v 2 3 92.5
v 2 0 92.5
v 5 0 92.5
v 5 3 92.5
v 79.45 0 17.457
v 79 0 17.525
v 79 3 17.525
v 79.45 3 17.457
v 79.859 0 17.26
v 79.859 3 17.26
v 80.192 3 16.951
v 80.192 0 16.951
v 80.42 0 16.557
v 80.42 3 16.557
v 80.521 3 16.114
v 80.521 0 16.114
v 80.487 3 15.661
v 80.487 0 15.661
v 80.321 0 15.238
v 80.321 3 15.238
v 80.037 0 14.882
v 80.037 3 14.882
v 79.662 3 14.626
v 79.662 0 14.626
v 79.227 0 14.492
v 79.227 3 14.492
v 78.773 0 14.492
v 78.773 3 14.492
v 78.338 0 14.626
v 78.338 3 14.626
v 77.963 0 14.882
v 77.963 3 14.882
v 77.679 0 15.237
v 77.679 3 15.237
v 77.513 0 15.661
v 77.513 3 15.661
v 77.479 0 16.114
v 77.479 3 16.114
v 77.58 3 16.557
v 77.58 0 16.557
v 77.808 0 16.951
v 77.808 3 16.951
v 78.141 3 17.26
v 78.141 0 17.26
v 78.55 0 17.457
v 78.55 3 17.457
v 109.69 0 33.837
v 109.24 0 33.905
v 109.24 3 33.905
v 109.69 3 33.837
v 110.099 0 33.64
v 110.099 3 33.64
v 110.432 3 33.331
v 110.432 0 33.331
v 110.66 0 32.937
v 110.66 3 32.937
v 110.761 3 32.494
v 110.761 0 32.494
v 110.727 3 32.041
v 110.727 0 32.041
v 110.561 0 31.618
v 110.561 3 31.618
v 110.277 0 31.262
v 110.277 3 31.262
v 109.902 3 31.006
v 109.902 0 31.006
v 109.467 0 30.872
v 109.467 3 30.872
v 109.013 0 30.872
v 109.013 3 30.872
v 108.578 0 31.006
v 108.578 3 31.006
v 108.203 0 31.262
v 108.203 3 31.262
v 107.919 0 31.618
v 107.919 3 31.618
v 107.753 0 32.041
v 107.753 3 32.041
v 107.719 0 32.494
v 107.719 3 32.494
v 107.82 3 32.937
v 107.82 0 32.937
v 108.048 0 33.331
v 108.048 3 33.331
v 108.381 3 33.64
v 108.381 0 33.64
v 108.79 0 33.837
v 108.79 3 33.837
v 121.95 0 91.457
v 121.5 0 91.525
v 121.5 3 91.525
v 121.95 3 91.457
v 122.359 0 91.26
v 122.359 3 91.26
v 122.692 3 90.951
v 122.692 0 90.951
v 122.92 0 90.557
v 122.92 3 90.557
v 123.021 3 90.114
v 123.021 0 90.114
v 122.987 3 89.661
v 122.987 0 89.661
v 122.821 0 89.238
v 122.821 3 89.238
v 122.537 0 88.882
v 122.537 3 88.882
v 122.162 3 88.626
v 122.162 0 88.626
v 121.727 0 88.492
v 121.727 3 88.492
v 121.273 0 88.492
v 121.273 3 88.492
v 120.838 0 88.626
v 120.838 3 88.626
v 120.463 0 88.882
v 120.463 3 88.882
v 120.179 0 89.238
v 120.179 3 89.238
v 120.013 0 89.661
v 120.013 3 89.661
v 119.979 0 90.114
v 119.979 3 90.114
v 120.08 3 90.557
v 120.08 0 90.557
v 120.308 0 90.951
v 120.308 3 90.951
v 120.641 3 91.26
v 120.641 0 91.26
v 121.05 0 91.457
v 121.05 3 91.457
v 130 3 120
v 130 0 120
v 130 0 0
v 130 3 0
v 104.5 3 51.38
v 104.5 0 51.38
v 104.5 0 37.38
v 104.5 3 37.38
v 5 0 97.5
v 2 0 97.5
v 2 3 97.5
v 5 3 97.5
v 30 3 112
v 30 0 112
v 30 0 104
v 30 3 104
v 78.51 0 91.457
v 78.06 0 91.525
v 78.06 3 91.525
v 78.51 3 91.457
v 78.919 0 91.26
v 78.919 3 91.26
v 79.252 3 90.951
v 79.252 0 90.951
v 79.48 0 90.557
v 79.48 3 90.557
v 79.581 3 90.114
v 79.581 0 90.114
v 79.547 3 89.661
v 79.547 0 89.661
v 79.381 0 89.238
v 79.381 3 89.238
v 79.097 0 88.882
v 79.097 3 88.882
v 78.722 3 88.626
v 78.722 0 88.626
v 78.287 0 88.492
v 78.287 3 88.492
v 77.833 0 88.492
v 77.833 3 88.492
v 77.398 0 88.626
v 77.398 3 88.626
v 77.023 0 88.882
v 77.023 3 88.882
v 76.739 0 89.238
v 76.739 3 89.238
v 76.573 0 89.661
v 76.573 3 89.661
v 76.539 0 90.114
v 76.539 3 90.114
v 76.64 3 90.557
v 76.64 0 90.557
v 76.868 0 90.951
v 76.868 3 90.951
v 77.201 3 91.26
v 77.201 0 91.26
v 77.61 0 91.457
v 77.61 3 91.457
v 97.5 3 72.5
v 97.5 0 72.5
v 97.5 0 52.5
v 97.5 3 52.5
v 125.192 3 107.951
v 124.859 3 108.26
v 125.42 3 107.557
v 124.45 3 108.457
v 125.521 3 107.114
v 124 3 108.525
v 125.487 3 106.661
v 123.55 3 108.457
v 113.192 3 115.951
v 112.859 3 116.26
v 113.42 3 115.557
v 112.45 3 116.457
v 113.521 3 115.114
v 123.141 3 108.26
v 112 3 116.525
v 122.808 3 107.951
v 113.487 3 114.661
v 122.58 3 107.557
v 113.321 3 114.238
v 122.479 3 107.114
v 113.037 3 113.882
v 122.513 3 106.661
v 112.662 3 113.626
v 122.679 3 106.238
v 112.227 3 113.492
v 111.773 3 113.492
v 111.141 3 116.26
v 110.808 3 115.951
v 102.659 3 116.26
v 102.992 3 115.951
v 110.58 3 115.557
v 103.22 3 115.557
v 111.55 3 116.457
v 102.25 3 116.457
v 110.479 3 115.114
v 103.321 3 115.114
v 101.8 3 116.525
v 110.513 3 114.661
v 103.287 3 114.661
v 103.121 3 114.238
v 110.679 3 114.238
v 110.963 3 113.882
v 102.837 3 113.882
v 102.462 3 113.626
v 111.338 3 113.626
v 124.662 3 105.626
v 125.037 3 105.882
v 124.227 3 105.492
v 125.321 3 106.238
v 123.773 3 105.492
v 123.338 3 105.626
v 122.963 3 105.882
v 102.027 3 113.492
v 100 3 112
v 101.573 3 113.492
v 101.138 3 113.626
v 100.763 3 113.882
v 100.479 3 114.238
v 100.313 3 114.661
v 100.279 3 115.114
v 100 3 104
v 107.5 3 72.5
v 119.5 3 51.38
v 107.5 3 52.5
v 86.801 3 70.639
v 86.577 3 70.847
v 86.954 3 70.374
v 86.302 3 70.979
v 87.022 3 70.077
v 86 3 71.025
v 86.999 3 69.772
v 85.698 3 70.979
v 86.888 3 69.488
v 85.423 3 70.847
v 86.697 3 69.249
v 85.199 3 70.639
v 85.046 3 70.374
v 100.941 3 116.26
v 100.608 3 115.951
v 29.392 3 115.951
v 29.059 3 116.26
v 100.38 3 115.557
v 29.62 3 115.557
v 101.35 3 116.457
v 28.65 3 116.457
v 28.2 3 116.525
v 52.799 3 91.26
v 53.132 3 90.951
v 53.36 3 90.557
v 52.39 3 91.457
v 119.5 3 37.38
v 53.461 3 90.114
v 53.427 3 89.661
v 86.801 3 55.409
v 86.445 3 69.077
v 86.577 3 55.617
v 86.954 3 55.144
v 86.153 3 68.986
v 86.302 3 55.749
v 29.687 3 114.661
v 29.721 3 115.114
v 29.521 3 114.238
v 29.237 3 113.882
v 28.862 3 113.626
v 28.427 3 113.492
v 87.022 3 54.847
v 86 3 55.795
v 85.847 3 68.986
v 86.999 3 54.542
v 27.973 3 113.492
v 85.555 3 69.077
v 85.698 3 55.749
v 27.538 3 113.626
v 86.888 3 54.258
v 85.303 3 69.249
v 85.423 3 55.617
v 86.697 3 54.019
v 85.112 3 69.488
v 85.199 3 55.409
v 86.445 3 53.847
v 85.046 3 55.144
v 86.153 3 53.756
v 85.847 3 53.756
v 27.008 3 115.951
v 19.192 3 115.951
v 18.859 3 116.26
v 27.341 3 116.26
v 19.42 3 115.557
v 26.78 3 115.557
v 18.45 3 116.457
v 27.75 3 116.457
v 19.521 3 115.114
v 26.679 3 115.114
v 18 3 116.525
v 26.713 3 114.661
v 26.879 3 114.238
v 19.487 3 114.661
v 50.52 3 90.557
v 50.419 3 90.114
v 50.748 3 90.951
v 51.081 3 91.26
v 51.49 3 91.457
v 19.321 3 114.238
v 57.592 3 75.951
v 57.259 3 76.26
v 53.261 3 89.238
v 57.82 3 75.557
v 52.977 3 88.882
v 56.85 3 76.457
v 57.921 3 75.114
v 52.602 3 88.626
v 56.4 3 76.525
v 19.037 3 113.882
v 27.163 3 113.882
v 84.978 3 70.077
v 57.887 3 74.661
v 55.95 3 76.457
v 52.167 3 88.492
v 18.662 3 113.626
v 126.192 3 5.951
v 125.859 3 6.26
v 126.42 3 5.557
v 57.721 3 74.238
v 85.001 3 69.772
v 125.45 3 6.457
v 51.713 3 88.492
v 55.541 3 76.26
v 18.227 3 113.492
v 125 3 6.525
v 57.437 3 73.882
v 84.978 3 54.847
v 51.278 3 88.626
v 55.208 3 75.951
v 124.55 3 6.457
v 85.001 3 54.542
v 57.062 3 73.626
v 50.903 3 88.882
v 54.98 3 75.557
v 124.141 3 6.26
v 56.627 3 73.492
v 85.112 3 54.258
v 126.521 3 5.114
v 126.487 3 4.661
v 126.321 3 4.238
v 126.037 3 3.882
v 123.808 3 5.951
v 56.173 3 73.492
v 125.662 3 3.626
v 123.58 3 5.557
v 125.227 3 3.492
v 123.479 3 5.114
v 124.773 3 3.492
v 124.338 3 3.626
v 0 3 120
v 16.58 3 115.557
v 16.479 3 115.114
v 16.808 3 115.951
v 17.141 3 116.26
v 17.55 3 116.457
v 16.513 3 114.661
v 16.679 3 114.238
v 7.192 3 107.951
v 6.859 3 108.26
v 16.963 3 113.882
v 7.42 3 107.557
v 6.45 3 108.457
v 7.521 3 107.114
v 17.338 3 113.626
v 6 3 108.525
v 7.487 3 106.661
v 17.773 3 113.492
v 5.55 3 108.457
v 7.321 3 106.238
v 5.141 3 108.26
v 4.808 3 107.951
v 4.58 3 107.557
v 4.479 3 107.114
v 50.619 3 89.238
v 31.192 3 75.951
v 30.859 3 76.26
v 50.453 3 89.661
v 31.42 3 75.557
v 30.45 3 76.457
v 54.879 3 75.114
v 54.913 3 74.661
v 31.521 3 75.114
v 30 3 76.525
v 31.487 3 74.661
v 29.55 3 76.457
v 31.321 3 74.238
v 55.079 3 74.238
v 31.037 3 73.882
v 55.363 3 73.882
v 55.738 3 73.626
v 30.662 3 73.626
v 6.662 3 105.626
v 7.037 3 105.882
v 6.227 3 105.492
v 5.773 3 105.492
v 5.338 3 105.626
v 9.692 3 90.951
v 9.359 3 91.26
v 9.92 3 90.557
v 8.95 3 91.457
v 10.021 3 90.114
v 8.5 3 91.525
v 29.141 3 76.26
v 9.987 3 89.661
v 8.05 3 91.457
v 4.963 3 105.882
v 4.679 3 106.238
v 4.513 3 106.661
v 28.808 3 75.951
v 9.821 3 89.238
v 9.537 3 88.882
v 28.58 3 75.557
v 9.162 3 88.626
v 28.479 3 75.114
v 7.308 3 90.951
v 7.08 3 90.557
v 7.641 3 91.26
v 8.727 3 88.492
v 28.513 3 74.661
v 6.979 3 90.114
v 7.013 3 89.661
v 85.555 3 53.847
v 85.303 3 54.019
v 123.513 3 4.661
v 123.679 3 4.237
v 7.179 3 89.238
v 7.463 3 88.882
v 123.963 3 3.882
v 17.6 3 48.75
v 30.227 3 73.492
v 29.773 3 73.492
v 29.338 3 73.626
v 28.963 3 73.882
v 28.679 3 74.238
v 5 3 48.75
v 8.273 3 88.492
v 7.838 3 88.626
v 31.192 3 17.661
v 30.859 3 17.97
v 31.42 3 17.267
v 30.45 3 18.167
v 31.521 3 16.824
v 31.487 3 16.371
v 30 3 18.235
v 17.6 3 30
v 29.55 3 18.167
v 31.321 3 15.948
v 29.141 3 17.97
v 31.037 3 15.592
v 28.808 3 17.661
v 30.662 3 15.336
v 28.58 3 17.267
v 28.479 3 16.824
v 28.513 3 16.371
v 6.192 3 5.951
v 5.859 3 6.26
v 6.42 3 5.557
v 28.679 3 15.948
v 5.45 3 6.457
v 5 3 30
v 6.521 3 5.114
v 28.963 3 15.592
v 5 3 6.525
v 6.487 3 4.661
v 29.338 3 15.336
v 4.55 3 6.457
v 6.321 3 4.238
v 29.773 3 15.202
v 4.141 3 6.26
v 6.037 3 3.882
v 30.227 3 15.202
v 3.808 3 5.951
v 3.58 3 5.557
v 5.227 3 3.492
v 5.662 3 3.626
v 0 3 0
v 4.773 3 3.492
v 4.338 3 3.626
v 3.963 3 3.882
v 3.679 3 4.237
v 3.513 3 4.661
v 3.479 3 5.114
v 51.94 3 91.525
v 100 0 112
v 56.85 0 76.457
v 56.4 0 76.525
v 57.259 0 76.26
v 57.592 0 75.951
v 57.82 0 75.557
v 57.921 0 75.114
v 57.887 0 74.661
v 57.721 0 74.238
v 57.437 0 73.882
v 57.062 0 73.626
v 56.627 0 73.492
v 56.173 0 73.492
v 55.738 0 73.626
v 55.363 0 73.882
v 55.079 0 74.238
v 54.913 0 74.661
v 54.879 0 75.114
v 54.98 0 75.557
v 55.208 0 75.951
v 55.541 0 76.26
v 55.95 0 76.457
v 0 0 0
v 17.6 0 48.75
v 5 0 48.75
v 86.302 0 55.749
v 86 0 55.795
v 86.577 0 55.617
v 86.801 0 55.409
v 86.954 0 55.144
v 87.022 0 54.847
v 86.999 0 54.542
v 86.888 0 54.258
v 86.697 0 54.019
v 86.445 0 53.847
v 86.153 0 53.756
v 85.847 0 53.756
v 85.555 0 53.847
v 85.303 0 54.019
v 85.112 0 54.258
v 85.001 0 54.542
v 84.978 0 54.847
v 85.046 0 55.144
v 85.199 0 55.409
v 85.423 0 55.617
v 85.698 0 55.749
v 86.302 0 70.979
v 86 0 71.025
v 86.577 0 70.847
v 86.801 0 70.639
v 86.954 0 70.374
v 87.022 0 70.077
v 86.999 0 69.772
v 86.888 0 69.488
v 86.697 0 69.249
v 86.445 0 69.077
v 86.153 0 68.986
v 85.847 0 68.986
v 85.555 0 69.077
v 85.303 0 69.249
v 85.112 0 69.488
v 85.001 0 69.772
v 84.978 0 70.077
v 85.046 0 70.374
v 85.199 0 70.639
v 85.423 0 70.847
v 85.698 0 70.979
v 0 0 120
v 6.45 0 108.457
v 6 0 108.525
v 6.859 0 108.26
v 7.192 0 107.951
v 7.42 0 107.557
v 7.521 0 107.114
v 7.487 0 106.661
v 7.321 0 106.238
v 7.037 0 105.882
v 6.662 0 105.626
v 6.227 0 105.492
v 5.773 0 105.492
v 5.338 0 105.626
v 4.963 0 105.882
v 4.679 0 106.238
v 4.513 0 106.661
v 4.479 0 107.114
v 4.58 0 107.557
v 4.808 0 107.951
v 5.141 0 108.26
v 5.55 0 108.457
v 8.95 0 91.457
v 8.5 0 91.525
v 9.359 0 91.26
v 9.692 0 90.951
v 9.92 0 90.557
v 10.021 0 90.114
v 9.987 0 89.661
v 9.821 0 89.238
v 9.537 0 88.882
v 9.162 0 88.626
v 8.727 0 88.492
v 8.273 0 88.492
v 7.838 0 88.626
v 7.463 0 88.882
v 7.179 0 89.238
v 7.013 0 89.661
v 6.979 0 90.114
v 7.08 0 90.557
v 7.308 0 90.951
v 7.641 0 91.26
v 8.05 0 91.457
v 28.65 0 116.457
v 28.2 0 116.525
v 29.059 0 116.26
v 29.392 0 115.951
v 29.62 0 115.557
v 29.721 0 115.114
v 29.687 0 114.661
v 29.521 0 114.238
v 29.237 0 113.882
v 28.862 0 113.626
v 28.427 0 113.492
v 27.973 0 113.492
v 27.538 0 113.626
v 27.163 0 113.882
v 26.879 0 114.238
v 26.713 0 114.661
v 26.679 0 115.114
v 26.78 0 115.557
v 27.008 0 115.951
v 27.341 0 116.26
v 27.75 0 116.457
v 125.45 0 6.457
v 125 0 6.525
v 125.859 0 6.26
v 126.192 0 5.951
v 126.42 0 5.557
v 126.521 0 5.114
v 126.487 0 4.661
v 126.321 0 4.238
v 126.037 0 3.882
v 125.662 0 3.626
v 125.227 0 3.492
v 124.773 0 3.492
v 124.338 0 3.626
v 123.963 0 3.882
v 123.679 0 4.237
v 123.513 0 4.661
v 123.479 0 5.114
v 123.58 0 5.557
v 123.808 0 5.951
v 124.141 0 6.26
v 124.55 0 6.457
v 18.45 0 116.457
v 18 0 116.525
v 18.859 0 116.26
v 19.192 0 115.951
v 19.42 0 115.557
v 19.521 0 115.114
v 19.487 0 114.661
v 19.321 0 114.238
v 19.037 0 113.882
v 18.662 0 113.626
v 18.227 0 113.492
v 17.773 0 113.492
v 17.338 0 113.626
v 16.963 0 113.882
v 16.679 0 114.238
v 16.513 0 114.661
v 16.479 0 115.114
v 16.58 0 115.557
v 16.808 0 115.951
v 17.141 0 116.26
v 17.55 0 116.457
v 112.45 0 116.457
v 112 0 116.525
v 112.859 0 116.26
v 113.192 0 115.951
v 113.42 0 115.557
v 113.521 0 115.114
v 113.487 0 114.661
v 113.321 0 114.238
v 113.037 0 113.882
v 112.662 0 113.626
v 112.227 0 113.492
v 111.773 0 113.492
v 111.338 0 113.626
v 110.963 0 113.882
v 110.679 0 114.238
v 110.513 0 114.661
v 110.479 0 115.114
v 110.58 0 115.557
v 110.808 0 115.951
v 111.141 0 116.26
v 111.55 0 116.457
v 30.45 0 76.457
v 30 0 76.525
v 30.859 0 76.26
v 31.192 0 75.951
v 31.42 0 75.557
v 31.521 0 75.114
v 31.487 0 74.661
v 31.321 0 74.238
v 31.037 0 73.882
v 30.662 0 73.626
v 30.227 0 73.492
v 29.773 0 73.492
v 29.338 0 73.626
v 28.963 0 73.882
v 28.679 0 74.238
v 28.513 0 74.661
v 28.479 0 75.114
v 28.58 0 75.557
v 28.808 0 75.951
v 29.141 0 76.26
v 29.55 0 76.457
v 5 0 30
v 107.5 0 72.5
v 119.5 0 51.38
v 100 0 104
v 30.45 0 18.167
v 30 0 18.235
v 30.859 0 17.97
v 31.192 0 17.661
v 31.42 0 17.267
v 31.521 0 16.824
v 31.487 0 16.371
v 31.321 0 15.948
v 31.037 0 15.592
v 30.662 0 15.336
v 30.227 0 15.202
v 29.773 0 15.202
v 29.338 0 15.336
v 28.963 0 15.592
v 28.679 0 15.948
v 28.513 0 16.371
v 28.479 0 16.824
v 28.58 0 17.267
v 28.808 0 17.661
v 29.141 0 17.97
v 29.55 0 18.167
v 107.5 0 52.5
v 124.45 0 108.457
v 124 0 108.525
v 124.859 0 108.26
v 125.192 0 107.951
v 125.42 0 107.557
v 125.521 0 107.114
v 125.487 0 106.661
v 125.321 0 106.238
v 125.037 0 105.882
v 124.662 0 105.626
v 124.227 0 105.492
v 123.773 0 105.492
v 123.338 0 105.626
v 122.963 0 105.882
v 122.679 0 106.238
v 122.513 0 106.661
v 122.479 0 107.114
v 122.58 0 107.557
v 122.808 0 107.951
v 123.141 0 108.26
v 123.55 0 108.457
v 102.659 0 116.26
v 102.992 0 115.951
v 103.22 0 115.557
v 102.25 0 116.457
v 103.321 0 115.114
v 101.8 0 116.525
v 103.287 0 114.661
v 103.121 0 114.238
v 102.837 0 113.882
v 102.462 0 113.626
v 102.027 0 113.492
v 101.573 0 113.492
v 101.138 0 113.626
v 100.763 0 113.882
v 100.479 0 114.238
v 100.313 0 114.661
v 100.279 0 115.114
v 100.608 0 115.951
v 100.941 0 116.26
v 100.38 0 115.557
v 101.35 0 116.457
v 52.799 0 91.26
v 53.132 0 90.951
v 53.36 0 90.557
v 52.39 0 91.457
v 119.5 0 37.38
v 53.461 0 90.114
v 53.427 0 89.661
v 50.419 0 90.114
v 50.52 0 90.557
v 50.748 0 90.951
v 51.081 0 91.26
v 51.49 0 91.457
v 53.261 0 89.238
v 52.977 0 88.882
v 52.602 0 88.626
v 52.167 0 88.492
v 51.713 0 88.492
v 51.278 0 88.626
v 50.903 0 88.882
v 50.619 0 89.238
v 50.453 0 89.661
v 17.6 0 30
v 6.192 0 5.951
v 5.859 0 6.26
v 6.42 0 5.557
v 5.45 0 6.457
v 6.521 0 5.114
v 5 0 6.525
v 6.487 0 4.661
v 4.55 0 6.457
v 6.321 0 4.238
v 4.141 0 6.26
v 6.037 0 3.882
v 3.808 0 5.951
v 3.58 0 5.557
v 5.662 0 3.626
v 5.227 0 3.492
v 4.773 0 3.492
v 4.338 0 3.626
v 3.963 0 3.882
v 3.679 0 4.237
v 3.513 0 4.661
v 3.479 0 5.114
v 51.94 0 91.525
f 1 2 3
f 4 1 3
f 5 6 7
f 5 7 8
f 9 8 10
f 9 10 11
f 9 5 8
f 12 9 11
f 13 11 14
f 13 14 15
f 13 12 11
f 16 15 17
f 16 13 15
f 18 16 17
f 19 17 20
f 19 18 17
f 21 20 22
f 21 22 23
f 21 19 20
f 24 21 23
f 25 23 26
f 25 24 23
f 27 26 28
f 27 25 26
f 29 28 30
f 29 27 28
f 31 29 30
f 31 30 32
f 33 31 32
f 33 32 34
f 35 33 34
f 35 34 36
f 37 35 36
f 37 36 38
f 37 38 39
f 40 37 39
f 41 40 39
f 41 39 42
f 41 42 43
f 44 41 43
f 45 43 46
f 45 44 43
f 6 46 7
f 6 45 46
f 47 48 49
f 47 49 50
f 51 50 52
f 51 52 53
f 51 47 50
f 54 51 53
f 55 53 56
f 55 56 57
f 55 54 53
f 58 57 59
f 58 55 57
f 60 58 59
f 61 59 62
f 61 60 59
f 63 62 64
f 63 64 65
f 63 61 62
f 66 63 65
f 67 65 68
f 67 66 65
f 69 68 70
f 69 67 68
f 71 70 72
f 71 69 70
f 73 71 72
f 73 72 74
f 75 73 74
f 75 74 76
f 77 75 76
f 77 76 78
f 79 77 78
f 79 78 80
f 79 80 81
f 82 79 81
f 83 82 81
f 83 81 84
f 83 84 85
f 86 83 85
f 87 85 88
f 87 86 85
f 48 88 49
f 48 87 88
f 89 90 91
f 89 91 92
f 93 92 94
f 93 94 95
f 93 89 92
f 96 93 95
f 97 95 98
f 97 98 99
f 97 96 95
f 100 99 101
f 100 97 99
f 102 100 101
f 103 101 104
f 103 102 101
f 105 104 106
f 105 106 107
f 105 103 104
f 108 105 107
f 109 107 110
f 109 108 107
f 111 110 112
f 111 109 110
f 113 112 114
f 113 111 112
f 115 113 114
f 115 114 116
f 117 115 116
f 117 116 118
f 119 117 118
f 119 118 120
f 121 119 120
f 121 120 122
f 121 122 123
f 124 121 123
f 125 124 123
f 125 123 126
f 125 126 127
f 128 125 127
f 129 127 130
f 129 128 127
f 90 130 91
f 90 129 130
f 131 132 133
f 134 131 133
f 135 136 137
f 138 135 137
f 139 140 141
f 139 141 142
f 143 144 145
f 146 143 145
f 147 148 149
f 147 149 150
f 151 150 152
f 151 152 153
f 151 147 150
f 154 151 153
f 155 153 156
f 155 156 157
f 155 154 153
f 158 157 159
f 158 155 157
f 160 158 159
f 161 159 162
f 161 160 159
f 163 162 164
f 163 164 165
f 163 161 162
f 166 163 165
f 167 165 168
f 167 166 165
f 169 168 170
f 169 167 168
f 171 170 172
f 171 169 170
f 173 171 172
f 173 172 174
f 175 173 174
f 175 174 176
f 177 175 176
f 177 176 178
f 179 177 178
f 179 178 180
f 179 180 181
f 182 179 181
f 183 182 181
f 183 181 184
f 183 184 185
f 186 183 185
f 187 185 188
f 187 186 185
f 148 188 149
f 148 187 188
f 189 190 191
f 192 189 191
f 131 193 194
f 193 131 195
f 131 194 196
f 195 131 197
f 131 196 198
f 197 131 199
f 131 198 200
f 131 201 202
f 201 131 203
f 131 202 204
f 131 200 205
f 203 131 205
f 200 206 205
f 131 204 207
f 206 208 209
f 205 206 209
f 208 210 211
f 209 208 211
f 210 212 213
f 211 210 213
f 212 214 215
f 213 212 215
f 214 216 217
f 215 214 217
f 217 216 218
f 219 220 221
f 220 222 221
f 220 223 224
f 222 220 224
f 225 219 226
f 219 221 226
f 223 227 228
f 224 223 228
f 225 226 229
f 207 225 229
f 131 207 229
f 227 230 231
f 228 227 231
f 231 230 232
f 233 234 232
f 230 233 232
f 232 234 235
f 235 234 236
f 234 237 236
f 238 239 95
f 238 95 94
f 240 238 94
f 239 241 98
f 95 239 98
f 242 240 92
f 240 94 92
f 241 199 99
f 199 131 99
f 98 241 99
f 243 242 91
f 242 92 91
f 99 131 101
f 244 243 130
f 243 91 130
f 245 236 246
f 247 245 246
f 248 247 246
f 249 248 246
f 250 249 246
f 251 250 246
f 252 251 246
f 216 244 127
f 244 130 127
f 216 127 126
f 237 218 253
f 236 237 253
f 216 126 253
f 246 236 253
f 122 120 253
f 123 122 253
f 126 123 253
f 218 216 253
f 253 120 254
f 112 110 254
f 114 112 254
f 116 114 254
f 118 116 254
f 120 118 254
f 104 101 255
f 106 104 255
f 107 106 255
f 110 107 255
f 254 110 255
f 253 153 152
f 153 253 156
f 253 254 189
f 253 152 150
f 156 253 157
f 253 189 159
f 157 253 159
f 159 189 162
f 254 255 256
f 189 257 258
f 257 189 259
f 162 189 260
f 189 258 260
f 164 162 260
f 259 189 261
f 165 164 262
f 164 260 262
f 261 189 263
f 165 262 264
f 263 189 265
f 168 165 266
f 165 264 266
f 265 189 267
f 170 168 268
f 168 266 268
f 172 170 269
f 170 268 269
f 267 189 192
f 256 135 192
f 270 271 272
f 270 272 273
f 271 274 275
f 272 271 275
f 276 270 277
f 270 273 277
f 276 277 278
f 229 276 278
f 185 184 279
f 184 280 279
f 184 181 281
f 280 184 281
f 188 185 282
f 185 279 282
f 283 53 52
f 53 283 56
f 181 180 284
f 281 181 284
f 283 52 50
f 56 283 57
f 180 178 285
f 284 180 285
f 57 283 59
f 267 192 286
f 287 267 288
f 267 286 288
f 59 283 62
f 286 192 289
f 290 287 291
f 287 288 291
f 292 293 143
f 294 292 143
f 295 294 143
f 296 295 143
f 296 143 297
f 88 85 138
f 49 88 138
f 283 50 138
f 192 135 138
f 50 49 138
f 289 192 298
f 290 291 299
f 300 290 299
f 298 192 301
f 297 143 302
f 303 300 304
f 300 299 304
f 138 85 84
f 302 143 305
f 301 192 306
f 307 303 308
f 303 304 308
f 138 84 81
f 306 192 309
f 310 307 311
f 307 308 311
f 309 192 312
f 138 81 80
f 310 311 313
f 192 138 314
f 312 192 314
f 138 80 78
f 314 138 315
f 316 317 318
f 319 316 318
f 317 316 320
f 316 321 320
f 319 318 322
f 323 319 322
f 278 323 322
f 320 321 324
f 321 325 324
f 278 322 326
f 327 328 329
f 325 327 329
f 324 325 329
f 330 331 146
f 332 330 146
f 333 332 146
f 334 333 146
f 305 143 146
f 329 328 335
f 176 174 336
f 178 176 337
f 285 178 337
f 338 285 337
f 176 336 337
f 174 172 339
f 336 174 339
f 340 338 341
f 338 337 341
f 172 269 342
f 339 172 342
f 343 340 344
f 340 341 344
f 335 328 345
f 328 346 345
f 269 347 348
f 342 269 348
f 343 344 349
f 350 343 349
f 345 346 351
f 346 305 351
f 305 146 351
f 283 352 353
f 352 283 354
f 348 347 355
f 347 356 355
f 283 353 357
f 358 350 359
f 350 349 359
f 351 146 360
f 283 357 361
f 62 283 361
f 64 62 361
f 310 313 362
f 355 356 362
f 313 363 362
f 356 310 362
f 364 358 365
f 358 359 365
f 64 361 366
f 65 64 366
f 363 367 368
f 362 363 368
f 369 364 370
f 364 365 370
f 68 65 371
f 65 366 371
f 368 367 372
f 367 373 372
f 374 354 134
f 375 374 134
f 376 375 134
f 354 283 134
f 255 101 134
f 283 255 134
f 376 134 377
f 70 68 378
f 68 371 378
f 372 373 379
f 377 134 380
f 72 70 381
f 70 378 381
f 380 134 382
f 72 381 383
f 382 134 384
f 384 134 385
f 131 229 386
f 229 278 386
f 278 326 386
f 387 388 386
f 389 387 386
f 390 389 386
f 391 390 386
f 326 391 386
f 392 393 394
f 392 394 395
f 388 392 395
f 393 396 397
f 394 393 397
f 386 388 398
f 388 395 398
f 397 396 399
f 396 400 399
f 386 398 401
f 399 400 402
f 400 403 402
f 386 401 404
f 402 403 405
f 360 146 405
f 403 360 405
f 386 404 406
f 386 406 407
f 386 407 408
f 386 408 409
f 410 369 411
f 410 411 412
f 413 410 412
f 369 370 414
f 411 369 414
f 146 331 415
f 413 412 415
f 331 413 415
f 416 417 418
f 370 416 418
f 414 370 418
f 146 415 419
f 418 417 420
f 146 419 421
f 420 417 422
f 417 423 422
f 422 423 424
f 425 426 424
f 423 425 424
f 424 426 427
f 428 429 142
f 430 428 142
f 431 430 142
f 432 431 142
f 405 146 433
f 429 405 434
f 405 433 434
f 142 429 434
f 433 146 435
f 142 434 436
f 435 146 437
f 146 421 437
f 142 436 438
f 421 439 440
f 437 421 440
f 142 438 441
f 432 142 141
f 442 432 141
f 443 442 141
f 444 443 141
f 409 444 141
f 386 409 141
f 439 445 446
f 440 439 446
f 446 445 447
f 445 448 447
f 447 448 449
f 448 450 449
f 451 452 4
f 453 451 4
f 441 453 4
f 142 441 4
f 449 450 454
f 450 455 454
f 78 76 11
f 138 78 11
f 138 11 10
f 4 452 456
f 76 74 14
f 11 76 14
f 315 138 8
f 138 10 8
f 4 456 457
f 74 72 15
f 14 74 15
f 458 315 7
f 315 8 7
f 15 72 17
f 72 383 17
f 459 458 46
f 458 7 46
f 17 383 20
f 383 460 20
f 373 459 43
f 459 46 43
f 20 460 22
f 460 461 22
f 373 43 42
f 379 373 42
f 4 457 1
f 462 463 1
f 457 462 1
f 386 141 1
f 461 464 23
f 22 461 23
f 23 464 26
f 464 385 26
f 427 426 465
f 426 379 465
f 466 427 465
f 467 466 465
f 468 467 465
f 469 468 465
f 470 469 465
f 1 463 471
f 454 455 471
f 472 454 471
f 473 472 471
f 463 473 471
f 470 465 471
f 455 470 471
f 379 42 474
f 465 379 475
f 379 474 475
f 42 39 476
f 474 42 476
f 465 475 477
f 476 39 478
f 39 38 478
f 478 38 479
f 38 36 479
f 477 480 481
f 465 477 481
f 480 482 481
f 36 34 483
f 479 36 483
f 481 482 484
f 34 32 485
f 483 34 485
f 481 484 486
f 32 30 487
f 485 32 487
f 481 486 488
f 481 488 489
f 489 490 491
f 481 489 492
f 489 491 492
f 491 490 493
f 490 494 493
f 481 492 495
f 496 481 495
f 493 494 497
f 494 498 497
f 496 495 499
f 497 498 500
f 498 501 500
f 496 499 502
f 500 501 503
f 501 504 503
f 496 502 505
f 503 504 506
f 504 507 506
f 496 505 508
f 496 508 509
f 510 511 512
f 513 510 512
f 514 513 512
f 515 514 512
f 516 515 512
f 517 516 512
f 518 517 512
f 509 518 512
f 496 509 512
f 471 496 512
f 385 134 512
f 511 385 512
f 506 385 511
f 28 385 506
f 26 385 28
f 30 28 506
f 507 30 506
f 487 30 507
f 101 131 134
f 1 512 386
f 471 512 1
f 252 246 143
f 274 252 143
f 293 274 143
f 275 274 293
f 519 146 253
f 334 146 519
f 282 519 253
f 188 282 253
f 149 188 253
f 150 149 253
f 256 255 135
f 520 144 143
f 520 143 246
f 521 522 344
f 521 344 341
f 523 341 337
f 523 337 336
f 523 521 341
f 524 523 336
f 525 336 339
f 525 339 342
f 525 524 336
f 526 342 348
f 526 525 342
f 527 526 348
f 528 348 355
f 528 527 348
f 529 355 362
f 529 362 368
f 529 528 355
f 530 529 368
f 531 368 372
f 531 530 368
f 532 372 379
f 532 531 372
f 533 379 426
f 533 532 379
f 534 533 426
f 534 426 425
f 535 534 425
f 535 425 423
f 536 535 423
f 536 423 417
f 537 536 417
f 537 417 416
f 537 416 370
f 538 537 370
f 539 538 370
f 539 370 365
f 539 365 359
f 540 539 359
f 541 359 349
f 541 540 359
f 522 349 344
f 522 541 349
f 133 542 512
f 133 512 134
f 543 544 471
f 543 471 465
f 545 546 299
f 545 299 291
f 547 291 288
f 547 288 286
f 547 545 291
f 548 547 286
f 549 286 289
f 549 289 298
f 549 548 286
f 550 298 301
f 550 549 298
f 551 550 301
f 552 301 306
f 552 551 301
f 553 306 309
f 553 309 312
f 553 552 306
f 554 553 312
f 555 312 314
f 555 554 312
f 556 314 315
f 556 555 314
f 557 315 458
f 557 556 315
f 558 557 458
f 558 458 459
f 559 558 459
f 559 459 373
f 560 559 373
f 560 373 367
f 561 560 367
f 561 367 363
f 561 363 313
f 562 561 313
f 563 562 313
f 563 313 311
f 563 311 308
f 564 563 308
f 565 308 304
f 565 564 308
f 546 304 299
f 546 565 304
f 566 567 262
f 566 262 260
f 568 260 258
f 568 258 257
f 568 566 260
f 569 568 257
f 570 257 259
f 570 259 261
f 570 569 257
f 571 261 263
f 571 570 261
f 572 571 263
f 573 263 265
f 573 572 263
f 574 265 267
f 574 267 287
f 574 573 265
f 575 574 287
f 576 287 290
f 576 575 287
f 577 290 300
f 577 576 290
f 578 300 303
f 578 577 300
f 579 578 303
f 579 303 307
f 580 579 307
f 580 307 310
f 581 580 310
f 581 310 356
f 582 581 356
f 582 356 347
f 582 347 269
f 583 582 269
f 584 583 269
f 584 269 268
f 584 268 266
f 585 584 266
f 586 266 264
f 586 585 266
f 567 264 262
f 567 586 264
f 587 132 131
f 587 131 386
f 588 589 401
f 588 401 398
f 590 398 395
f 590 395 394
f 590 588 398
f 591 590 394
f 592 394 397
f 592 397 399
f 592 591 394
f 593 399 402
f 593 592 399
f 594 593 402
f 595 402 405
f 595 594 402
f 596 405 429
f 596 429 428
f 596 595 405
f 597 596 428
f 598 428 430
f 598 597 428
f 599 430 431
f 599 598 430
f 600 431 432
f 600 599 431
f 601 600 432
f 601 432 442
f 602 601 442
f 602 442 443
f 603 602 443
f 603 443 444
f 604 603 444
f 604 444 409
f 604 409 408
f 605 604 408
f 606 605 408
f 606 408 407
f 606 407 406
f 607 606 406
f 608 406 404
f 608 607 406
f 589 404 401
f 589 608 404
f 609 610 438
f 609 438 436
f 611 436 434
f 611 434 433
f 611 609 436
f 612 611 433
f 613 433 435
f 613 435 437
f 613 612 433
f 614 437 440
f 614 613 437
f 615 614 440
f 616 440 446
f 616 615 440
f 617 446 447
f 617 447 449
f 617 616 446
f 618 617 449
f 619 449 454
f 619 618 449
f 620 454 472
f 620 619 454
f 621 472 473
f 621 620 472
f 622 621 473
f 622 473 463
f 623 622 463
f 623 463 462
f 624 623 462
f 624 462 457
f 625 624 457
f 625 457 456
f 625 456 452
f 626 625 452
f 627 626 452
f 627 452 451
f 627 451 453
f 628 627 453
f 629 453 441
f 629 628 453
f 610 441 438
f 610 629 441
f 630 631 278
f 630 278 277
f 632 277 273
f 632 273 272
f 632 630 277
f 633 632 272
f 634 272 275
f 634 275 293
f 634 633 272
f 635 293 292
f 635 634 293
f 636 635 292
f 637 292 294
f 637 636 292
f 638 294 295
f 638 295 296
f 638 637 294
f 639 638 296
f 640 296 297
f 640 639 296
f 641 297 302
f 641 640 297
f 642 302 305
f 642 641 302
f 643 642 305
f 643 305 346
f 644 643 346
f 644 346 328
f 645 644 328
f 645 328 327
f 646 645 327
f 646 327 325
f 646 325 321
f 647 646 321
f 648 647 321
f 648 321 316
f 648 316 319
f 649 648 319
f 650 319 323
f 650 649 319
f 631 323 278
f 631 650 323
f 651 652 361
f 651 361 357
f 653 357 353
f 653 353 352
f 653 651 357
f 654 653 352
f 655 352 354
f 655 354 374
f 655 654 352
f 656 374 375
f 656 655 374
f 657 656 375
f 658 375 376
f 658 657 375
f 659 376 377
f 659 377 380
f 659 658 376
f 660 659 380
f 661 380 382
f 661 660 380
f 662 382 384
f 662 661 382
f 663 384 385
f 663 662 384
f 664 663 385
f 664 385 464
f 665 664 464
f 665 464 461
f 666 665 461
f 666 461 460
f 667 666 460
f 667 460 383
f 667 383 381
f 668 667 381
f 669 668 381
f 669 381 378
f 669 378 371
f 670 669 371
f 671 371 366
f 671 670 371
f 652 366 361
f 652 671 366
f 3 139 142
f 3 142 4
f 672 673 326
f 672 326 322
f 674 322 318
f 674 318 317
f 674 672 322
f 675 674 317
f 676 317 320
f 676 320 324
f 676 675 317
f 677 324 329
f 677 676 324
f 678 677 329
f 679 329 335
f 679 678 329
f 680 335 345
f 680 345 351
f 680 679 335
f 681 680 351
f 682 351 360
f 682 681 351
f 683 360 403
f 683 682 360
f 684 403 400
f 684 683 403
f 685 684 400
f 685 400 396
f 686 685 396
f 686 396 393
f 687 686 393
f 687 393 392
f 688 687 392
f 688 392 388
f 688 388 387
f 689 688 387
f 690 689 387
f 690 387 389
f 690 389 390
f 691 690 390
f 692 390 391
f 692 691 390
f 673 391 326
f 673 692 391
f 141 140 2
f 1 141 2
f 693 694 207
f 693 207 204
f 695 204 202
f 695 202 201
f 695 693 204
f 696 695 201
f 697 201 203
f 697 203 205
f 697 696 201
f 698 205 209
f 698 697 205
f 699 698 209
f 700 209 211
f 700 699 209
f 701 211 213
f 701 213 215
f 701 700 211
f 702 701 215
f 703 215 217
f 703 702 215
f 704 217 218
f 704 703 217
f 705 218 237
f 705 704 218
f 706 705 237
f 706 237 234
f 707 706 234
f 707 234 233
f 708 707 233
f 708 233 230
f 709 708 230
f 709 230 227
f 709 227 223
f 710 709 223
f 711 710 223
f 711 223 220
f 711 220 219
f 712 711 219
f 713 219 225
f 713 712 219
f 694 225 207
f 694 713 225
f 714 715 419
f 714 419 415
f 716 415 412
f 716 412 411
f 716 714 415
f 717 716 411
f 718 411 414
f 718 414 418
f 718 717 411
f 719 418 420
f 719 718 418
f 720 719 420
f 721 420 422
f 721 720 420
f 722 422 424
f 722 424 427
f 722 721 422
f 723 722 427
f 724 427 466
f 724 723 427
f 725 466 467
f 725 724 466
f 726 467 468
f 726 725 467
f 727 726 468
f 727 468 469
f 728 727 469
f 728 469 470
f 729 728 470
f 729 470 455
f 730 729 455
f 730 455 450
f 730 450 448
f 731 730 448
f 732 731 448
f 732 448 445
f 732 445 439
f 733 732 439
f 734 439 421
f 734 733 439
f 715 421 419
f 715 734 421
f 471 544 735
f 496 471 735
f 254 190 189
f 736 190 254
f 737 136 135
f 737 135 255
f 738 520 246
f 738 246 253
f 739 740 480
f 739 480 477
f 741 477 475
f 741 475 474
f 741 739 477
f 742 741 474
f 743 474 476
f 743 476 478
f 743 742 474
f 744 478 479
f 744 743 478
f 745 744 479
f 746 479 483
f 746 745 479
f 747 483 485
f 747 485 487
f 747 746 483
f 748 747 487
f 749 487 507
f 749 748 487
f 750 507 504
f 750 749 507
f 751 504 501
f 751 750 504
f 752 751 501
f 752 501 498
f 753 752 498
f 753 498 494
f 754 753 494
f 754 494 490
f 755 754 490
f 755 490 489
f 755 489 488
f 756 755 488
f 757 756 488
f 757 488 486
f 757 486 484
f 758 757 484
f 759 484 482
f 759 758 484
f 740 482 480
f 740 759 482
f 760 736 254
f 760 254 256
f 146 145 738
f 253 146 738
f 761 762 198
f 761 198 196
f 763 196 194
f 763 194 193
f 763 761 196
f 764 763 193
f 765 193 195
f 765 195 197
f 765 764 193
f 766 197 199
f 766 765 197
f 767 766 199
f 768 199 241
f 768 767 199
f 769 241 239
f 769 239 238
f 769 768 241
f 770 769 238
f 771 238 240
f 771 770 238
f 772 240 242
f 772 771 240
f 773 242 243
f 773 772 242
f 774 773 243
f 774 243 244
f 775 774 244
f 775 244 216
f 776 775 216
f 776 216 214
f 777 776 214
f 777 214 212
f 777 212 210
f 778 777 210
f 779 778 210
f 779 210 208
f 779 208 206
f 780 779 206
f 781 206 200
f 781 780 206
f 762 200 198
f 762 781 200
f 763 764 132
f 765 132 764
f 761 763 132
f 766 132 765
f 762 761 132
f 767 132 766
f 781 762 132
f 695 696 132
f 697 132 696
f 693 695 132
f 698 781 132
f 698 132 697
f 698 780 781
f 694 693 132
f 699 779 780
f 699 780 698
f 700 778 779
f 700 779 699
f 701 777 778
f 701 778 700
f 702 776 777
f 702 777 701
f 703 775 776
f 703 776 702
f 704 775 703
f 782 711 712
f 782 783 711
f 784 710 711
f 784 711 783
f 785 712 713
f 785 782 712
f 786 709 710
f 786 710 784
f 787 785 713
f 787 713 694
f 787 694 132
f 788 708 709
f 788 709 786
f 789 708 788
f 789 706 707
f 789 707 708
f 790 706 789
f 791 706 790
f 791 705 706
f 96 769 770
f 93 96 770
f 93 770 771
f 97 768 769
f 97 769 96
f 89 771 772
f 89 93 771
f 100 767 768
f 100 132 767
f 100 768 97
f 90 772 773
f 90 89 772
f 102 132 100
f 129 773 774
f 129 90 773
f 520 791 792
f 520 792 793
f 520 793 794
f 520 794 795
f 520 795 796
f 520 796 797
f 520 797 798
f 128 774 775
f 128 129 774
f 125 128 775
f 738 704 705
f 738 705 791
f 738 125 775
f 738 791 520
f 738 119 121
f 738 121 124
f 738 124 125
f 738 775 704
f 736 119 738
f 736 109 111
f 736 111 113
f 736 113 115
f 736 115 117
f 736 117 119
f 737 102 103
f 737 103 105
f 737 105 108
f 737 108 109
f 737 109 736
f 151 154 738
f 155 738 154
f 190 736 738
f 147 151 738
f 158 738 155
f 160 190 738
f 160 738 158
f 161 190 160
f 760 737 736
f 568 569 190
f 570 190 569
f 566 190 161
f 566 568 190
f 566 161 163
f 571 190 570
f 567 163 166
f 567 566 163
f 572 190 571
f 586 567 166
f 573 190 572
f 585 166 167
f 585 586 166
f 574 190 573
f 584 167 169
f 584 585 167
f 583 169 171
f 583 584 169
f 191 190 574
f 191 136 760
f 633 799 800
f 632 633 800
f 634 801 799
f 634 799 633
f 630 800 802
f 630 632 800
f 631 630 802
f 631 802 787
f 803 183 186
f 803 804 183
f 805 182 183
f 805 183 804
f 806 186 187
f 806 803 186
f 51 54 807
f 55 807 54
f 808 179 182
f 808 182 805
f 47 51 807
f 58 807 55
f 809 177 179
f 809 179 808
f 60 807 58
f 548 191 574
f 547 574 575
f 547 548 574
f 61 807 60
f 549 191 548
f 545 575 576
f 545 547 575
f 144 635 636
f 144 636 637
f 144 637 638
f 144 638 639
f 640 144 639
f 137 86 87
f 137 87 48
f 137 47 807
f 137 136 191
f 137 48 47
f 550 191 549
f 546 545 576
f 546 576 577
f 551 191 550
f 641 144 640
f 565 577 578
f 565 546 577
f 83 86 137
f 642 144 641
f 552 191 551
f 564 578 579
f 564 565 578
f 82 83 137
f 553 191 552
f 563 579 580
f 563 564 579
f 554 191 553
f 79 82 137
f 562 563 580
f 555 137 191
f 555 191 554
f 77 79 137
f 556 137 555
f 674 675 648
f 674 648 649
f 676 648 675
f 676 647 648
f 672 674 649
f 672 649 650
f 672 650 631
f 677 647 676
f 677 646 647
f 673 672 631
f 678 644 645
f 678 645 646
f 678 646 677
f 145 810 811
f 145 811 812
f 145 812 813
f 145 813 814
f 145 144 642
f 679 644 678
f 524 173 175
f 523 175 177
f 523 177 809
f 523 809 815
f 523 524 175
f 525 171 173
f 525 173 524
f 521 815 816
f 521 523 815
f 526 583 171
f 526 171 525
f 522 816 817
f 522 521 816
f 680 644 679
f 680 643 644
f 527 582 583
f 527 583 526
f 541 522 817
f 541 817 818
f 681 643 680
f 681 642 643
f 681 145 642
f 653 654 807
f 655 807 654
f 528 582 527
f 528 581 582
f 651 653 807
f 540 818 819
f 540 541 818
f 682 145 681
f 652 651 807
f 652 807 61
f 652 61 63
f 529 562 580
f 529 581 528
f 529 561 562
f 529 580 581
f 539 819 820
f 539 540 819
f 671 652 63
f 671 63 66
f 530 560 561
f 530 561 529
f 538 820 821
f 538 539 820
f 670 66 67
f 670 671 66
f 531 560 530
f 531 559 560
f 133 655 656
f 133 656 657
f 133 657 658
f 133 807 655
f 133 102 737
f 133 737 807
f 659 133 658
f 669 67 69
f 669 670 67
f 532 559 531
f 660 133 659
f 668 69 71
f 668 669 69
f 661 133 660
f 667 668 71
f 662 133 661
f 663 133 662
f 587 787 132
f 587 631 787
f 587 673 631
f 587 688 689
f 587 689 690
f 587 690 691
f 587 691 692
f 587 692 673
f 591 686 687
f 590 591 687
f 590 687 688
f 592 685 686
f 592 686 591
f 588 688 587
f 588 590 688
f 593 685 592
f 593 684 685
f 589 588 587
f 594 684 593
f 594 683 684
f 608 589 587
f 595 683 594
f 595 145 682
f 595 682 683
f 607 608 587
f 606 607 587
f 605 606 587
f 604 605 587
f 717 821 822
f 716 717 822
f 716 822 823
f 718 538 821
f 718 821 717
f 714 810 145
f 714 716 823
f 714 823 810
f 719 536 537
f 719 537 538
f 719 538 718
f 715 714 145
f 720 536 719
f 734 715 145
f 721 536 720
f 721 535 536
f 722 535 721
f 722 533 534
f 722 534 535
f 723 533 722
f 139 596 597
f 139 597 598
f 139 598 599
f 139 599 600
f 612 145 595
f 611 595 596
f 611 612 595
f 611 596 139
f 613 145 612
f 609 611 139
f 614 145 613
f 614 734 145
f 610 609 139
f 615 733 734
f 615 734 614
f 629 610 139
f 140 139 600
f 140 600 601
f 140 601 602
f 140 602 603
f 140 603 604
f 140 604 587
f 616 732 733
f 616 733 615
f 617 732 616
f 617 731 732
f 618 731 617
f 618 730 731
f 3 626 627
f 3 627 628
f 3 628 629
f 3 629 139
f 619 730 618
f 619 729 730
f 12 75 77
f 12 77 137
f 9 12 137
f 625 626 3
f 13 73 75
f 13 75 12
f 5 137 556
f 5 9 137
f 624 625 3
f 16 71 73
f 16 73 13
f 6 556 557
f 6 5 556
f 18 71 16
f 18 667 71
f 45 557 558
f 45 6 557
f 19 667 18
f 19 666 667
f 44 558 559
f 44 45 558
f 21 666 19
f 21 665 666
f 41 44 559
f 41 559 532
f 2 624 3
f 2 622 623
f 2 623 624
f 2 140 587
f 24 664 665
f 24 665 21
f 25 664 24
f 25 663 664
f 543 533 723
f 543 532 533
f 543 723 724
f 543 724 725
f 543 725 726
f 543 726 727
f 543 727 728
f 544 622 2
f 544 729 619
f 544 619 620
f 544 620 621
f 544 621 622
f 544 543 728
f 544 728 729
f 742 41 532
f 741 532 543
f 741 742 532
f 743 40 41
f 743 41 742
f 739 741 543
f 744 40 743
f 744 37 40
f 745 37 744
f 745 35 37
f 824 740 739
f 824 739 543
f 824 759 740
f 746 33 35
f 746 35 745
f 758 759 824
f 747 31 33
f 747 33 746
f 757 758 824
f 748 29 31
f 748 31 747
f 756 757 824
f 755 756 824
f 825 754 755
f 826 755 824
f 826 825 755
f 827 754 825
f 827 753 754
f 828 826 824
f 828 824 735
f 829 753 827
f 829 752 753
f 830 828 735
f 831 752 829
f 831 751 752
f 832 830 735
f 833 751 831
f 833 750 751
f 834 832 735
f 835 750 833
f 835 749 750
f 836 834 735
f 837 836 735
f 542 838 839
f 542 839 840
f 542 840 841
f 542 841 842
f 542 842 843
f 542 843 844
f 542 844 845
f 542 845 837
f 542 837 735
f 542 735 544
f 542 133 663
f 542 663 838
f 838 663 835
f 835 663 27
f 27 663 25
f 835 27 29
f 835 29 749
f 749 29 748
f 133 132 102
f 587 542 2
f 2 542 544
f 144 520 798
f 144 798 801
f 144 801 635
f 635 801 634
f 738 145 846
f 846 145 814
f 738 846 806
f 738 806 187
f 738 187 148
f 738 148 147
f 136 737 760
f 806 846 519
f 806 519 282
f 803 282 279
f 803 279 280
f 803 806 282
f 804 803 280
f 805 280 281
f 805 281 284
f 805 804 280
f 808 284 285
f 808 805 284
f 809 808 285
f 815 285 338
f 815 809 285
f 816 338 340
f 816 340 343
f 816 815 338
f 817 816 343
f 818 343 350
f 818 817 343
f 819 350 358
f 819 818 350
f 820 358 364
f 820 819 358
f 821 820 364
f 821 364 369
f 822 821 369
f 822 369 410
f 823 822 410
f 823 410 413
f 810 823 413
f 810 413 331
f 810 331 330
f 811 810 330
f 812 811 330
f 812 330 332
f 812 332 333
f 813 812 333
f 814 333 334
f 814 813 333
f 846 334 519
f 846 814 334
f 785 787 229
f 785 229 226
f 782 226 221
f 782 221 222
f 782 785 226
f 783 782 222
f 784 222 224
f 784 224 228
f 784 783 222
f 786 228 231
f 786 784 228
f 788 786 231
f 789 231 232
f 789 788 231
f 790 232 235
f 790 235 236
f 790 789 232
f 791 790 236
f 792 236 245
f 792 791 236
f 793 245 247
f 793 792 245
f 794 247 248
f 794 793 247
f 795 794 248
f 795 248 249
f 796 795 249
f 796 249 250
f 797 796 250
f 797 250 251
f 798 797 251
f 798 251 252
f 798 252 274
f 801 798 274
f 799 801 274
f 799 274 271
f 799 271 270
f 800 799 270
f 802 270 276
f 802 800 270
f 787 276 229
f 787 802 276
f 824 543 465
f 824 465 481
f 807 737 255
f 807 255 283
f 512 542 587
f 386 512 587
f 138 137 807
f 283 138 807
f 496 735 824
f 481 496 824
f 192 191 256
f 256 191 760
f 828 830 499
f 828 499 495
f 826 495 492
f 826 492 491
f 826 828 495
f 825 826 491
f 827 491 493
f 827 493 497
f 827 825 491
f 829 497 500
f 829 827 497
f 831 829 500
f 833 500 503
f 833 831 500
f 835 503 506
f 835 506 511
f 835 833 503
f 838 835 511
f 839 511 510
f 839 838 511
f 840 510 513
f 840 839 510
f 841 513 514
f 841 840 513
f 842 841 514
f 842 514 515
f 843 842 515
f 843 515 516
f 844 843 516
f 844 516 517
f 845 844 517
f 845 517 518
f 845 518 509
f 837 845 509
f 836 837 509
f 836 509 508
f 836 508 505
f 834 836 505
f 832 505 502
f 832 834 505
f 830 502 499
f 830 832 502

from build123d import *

# Parameters (mm, degrees)
SKETCH1_R           = 1.525
SKETCH1_R_2         = 1.025
SKETCH1_W           = 70
SKETCH1_H           = 8
SKETCH1_W_2         = 3
SKETCH1_H_2         = 5
SKETCH1_W_3         = 10
SKETCH1_H_3         = 20
SKETCH1_W_4         = 15
SKETCH1_H_4         = 14
SKETCH1_W_5         = 12.6
SKETCH1_H_5         = 18.75
BOSS_EXTRUDE1_DEPTH = 3


with BuildPart() as part:
    # Sketch1 → Boss-Extrude1 (new body)
    with BuildSketch(Plane(origin=(0, 0, 0), x_dir=(1, 0, 0), z_dir=(0, 1, 0))):
        Polygon((0, 0), (130, 0), (130, -92.5), (130, -97.5), (130, -120), (0, -120), (0, -97.5), (0, -92.5), align=None)
        with Locations(Location((28.2, -115, 0), (0, 0, 270))):
            Circle(SKETCH1_R, mode=Mode.SUBTRACT)
        with Locations(Location((101.8, -115, 0), (0, 0, 270))):
            Circle(SKETCH1_R, mode=Mode.SUBTRACT)
        with Locations(Location((121.5, -90, 0), (0, 0, 270))):
            Circle(SKETCH1_R, mode=Mode.SUBTRACT)
        with Locations(Location((8.5, -90, 0), (0, 0, 270))):
            Circle(SKETCH1_R, mode=Mode.SUBTRACT)
        with Locations(Location((78.06, -90, 0), (0, 0, 270))):
            Circle(SKETCH1_R, mode=Mode.SUBTRACT)
        with Locations(Location((51.94, -90, 0), (0, 0, 270))):
            Circle(SKETCH1_R, mode=Mode.SUBTRACT)
        with Locations(Location((124, -107, 0), (0, 0, 270))):
            Circle(SKETCH1_R, mode=Mode.SUBTRACT)
        with Locations(Location((6, -107, 0), (0, 0, 270))):
            Circle(SKETCH1_R, mode=Mode.SUBTRACT)
        with Locations(Location((30, -75, 0), (0, 0, 270))):
            Circle(SKETCH1_R, mode=Mode.SUBTRACT)
        with Locations(Location((30, -16.71, 0), (0, 0, 270))):
            Circle(SKETCH1_R, mode=Mode.SUBTRACT)
        with Locations(Location((56.4, -75, 0), (0, 0, 270))):
            Circle(SKETCH1_R, mode=Mode.SUBTRACT)
        with Locations(Location((86, -70, 0), (0, 0, 270))):
            Circle(SKETCH1_R_2, mode=Mode.SUBTRACT)
        with Locations(Location((86, -54.77, 0), (0, 0, 270))):
            Circle(SKETCH1_R_2, mode=Mode.SUBTRACT)
        with Locations(Location((79, -16, 0), (0, 0, 270))):
            Circle(SKETCH1_R, mode=Mode.SUBTRACT)
        with Locations(Location((109.24, -32.38, 0), (0, 0, 270))):
            Circle(SKETCH1_R, mode=Mode.SUBTRACT)
        with Locations(Location((18, -115, 0), (0, 0, 270))):
            Circle(SKETCH1_R, mode=Mode.SUBTRACT)
        with Locations(Location((112, -115, 0), (0, 0, 270))):
            Circle(SKETCH1_R, mode=Mode.SUBTRACT)
        with Locations(Location((5, -5, 0), (0, 0, 270))):
            Circle(SKETCH1_R, mode=Mode.SUBTRACT)
        with Locations(Location((125, -5, 0), (0, 0, 270))):
            Circle(SKETCH1_R, mode=Mode.SUBTRACT)
        with Locations((65, -108)):
            Rectangle(SKETCH1_W, SKETCH1_H, mode=Mode.SUBTRACT)
        with Locations((3.5, -95)):
            Rectangle(SKETCH1_W_2, SKETCH1_H_2, mode=Mode.SUBTRACT)
        with Locations((102.5, -62.5)):
            Rectangle(SKETCH1_W_3, SKETCH1_H_3, mode=Mode.SUBTRACT)
        with Locations((112, -44.38)):
            Rectangle(SKETCH1_W_4, SKETCH1_H_4, mode=Mode.SUBTRACT)
        with Locations((11.3, -39.375)):
            Rectangle(SKETCH1_W_5, SKETCH1_H_5, mode=Mode.SUBTRACT)
    extrude(amount=BOSS_EXTRUDE1_DEPTH)


solid = part.part
